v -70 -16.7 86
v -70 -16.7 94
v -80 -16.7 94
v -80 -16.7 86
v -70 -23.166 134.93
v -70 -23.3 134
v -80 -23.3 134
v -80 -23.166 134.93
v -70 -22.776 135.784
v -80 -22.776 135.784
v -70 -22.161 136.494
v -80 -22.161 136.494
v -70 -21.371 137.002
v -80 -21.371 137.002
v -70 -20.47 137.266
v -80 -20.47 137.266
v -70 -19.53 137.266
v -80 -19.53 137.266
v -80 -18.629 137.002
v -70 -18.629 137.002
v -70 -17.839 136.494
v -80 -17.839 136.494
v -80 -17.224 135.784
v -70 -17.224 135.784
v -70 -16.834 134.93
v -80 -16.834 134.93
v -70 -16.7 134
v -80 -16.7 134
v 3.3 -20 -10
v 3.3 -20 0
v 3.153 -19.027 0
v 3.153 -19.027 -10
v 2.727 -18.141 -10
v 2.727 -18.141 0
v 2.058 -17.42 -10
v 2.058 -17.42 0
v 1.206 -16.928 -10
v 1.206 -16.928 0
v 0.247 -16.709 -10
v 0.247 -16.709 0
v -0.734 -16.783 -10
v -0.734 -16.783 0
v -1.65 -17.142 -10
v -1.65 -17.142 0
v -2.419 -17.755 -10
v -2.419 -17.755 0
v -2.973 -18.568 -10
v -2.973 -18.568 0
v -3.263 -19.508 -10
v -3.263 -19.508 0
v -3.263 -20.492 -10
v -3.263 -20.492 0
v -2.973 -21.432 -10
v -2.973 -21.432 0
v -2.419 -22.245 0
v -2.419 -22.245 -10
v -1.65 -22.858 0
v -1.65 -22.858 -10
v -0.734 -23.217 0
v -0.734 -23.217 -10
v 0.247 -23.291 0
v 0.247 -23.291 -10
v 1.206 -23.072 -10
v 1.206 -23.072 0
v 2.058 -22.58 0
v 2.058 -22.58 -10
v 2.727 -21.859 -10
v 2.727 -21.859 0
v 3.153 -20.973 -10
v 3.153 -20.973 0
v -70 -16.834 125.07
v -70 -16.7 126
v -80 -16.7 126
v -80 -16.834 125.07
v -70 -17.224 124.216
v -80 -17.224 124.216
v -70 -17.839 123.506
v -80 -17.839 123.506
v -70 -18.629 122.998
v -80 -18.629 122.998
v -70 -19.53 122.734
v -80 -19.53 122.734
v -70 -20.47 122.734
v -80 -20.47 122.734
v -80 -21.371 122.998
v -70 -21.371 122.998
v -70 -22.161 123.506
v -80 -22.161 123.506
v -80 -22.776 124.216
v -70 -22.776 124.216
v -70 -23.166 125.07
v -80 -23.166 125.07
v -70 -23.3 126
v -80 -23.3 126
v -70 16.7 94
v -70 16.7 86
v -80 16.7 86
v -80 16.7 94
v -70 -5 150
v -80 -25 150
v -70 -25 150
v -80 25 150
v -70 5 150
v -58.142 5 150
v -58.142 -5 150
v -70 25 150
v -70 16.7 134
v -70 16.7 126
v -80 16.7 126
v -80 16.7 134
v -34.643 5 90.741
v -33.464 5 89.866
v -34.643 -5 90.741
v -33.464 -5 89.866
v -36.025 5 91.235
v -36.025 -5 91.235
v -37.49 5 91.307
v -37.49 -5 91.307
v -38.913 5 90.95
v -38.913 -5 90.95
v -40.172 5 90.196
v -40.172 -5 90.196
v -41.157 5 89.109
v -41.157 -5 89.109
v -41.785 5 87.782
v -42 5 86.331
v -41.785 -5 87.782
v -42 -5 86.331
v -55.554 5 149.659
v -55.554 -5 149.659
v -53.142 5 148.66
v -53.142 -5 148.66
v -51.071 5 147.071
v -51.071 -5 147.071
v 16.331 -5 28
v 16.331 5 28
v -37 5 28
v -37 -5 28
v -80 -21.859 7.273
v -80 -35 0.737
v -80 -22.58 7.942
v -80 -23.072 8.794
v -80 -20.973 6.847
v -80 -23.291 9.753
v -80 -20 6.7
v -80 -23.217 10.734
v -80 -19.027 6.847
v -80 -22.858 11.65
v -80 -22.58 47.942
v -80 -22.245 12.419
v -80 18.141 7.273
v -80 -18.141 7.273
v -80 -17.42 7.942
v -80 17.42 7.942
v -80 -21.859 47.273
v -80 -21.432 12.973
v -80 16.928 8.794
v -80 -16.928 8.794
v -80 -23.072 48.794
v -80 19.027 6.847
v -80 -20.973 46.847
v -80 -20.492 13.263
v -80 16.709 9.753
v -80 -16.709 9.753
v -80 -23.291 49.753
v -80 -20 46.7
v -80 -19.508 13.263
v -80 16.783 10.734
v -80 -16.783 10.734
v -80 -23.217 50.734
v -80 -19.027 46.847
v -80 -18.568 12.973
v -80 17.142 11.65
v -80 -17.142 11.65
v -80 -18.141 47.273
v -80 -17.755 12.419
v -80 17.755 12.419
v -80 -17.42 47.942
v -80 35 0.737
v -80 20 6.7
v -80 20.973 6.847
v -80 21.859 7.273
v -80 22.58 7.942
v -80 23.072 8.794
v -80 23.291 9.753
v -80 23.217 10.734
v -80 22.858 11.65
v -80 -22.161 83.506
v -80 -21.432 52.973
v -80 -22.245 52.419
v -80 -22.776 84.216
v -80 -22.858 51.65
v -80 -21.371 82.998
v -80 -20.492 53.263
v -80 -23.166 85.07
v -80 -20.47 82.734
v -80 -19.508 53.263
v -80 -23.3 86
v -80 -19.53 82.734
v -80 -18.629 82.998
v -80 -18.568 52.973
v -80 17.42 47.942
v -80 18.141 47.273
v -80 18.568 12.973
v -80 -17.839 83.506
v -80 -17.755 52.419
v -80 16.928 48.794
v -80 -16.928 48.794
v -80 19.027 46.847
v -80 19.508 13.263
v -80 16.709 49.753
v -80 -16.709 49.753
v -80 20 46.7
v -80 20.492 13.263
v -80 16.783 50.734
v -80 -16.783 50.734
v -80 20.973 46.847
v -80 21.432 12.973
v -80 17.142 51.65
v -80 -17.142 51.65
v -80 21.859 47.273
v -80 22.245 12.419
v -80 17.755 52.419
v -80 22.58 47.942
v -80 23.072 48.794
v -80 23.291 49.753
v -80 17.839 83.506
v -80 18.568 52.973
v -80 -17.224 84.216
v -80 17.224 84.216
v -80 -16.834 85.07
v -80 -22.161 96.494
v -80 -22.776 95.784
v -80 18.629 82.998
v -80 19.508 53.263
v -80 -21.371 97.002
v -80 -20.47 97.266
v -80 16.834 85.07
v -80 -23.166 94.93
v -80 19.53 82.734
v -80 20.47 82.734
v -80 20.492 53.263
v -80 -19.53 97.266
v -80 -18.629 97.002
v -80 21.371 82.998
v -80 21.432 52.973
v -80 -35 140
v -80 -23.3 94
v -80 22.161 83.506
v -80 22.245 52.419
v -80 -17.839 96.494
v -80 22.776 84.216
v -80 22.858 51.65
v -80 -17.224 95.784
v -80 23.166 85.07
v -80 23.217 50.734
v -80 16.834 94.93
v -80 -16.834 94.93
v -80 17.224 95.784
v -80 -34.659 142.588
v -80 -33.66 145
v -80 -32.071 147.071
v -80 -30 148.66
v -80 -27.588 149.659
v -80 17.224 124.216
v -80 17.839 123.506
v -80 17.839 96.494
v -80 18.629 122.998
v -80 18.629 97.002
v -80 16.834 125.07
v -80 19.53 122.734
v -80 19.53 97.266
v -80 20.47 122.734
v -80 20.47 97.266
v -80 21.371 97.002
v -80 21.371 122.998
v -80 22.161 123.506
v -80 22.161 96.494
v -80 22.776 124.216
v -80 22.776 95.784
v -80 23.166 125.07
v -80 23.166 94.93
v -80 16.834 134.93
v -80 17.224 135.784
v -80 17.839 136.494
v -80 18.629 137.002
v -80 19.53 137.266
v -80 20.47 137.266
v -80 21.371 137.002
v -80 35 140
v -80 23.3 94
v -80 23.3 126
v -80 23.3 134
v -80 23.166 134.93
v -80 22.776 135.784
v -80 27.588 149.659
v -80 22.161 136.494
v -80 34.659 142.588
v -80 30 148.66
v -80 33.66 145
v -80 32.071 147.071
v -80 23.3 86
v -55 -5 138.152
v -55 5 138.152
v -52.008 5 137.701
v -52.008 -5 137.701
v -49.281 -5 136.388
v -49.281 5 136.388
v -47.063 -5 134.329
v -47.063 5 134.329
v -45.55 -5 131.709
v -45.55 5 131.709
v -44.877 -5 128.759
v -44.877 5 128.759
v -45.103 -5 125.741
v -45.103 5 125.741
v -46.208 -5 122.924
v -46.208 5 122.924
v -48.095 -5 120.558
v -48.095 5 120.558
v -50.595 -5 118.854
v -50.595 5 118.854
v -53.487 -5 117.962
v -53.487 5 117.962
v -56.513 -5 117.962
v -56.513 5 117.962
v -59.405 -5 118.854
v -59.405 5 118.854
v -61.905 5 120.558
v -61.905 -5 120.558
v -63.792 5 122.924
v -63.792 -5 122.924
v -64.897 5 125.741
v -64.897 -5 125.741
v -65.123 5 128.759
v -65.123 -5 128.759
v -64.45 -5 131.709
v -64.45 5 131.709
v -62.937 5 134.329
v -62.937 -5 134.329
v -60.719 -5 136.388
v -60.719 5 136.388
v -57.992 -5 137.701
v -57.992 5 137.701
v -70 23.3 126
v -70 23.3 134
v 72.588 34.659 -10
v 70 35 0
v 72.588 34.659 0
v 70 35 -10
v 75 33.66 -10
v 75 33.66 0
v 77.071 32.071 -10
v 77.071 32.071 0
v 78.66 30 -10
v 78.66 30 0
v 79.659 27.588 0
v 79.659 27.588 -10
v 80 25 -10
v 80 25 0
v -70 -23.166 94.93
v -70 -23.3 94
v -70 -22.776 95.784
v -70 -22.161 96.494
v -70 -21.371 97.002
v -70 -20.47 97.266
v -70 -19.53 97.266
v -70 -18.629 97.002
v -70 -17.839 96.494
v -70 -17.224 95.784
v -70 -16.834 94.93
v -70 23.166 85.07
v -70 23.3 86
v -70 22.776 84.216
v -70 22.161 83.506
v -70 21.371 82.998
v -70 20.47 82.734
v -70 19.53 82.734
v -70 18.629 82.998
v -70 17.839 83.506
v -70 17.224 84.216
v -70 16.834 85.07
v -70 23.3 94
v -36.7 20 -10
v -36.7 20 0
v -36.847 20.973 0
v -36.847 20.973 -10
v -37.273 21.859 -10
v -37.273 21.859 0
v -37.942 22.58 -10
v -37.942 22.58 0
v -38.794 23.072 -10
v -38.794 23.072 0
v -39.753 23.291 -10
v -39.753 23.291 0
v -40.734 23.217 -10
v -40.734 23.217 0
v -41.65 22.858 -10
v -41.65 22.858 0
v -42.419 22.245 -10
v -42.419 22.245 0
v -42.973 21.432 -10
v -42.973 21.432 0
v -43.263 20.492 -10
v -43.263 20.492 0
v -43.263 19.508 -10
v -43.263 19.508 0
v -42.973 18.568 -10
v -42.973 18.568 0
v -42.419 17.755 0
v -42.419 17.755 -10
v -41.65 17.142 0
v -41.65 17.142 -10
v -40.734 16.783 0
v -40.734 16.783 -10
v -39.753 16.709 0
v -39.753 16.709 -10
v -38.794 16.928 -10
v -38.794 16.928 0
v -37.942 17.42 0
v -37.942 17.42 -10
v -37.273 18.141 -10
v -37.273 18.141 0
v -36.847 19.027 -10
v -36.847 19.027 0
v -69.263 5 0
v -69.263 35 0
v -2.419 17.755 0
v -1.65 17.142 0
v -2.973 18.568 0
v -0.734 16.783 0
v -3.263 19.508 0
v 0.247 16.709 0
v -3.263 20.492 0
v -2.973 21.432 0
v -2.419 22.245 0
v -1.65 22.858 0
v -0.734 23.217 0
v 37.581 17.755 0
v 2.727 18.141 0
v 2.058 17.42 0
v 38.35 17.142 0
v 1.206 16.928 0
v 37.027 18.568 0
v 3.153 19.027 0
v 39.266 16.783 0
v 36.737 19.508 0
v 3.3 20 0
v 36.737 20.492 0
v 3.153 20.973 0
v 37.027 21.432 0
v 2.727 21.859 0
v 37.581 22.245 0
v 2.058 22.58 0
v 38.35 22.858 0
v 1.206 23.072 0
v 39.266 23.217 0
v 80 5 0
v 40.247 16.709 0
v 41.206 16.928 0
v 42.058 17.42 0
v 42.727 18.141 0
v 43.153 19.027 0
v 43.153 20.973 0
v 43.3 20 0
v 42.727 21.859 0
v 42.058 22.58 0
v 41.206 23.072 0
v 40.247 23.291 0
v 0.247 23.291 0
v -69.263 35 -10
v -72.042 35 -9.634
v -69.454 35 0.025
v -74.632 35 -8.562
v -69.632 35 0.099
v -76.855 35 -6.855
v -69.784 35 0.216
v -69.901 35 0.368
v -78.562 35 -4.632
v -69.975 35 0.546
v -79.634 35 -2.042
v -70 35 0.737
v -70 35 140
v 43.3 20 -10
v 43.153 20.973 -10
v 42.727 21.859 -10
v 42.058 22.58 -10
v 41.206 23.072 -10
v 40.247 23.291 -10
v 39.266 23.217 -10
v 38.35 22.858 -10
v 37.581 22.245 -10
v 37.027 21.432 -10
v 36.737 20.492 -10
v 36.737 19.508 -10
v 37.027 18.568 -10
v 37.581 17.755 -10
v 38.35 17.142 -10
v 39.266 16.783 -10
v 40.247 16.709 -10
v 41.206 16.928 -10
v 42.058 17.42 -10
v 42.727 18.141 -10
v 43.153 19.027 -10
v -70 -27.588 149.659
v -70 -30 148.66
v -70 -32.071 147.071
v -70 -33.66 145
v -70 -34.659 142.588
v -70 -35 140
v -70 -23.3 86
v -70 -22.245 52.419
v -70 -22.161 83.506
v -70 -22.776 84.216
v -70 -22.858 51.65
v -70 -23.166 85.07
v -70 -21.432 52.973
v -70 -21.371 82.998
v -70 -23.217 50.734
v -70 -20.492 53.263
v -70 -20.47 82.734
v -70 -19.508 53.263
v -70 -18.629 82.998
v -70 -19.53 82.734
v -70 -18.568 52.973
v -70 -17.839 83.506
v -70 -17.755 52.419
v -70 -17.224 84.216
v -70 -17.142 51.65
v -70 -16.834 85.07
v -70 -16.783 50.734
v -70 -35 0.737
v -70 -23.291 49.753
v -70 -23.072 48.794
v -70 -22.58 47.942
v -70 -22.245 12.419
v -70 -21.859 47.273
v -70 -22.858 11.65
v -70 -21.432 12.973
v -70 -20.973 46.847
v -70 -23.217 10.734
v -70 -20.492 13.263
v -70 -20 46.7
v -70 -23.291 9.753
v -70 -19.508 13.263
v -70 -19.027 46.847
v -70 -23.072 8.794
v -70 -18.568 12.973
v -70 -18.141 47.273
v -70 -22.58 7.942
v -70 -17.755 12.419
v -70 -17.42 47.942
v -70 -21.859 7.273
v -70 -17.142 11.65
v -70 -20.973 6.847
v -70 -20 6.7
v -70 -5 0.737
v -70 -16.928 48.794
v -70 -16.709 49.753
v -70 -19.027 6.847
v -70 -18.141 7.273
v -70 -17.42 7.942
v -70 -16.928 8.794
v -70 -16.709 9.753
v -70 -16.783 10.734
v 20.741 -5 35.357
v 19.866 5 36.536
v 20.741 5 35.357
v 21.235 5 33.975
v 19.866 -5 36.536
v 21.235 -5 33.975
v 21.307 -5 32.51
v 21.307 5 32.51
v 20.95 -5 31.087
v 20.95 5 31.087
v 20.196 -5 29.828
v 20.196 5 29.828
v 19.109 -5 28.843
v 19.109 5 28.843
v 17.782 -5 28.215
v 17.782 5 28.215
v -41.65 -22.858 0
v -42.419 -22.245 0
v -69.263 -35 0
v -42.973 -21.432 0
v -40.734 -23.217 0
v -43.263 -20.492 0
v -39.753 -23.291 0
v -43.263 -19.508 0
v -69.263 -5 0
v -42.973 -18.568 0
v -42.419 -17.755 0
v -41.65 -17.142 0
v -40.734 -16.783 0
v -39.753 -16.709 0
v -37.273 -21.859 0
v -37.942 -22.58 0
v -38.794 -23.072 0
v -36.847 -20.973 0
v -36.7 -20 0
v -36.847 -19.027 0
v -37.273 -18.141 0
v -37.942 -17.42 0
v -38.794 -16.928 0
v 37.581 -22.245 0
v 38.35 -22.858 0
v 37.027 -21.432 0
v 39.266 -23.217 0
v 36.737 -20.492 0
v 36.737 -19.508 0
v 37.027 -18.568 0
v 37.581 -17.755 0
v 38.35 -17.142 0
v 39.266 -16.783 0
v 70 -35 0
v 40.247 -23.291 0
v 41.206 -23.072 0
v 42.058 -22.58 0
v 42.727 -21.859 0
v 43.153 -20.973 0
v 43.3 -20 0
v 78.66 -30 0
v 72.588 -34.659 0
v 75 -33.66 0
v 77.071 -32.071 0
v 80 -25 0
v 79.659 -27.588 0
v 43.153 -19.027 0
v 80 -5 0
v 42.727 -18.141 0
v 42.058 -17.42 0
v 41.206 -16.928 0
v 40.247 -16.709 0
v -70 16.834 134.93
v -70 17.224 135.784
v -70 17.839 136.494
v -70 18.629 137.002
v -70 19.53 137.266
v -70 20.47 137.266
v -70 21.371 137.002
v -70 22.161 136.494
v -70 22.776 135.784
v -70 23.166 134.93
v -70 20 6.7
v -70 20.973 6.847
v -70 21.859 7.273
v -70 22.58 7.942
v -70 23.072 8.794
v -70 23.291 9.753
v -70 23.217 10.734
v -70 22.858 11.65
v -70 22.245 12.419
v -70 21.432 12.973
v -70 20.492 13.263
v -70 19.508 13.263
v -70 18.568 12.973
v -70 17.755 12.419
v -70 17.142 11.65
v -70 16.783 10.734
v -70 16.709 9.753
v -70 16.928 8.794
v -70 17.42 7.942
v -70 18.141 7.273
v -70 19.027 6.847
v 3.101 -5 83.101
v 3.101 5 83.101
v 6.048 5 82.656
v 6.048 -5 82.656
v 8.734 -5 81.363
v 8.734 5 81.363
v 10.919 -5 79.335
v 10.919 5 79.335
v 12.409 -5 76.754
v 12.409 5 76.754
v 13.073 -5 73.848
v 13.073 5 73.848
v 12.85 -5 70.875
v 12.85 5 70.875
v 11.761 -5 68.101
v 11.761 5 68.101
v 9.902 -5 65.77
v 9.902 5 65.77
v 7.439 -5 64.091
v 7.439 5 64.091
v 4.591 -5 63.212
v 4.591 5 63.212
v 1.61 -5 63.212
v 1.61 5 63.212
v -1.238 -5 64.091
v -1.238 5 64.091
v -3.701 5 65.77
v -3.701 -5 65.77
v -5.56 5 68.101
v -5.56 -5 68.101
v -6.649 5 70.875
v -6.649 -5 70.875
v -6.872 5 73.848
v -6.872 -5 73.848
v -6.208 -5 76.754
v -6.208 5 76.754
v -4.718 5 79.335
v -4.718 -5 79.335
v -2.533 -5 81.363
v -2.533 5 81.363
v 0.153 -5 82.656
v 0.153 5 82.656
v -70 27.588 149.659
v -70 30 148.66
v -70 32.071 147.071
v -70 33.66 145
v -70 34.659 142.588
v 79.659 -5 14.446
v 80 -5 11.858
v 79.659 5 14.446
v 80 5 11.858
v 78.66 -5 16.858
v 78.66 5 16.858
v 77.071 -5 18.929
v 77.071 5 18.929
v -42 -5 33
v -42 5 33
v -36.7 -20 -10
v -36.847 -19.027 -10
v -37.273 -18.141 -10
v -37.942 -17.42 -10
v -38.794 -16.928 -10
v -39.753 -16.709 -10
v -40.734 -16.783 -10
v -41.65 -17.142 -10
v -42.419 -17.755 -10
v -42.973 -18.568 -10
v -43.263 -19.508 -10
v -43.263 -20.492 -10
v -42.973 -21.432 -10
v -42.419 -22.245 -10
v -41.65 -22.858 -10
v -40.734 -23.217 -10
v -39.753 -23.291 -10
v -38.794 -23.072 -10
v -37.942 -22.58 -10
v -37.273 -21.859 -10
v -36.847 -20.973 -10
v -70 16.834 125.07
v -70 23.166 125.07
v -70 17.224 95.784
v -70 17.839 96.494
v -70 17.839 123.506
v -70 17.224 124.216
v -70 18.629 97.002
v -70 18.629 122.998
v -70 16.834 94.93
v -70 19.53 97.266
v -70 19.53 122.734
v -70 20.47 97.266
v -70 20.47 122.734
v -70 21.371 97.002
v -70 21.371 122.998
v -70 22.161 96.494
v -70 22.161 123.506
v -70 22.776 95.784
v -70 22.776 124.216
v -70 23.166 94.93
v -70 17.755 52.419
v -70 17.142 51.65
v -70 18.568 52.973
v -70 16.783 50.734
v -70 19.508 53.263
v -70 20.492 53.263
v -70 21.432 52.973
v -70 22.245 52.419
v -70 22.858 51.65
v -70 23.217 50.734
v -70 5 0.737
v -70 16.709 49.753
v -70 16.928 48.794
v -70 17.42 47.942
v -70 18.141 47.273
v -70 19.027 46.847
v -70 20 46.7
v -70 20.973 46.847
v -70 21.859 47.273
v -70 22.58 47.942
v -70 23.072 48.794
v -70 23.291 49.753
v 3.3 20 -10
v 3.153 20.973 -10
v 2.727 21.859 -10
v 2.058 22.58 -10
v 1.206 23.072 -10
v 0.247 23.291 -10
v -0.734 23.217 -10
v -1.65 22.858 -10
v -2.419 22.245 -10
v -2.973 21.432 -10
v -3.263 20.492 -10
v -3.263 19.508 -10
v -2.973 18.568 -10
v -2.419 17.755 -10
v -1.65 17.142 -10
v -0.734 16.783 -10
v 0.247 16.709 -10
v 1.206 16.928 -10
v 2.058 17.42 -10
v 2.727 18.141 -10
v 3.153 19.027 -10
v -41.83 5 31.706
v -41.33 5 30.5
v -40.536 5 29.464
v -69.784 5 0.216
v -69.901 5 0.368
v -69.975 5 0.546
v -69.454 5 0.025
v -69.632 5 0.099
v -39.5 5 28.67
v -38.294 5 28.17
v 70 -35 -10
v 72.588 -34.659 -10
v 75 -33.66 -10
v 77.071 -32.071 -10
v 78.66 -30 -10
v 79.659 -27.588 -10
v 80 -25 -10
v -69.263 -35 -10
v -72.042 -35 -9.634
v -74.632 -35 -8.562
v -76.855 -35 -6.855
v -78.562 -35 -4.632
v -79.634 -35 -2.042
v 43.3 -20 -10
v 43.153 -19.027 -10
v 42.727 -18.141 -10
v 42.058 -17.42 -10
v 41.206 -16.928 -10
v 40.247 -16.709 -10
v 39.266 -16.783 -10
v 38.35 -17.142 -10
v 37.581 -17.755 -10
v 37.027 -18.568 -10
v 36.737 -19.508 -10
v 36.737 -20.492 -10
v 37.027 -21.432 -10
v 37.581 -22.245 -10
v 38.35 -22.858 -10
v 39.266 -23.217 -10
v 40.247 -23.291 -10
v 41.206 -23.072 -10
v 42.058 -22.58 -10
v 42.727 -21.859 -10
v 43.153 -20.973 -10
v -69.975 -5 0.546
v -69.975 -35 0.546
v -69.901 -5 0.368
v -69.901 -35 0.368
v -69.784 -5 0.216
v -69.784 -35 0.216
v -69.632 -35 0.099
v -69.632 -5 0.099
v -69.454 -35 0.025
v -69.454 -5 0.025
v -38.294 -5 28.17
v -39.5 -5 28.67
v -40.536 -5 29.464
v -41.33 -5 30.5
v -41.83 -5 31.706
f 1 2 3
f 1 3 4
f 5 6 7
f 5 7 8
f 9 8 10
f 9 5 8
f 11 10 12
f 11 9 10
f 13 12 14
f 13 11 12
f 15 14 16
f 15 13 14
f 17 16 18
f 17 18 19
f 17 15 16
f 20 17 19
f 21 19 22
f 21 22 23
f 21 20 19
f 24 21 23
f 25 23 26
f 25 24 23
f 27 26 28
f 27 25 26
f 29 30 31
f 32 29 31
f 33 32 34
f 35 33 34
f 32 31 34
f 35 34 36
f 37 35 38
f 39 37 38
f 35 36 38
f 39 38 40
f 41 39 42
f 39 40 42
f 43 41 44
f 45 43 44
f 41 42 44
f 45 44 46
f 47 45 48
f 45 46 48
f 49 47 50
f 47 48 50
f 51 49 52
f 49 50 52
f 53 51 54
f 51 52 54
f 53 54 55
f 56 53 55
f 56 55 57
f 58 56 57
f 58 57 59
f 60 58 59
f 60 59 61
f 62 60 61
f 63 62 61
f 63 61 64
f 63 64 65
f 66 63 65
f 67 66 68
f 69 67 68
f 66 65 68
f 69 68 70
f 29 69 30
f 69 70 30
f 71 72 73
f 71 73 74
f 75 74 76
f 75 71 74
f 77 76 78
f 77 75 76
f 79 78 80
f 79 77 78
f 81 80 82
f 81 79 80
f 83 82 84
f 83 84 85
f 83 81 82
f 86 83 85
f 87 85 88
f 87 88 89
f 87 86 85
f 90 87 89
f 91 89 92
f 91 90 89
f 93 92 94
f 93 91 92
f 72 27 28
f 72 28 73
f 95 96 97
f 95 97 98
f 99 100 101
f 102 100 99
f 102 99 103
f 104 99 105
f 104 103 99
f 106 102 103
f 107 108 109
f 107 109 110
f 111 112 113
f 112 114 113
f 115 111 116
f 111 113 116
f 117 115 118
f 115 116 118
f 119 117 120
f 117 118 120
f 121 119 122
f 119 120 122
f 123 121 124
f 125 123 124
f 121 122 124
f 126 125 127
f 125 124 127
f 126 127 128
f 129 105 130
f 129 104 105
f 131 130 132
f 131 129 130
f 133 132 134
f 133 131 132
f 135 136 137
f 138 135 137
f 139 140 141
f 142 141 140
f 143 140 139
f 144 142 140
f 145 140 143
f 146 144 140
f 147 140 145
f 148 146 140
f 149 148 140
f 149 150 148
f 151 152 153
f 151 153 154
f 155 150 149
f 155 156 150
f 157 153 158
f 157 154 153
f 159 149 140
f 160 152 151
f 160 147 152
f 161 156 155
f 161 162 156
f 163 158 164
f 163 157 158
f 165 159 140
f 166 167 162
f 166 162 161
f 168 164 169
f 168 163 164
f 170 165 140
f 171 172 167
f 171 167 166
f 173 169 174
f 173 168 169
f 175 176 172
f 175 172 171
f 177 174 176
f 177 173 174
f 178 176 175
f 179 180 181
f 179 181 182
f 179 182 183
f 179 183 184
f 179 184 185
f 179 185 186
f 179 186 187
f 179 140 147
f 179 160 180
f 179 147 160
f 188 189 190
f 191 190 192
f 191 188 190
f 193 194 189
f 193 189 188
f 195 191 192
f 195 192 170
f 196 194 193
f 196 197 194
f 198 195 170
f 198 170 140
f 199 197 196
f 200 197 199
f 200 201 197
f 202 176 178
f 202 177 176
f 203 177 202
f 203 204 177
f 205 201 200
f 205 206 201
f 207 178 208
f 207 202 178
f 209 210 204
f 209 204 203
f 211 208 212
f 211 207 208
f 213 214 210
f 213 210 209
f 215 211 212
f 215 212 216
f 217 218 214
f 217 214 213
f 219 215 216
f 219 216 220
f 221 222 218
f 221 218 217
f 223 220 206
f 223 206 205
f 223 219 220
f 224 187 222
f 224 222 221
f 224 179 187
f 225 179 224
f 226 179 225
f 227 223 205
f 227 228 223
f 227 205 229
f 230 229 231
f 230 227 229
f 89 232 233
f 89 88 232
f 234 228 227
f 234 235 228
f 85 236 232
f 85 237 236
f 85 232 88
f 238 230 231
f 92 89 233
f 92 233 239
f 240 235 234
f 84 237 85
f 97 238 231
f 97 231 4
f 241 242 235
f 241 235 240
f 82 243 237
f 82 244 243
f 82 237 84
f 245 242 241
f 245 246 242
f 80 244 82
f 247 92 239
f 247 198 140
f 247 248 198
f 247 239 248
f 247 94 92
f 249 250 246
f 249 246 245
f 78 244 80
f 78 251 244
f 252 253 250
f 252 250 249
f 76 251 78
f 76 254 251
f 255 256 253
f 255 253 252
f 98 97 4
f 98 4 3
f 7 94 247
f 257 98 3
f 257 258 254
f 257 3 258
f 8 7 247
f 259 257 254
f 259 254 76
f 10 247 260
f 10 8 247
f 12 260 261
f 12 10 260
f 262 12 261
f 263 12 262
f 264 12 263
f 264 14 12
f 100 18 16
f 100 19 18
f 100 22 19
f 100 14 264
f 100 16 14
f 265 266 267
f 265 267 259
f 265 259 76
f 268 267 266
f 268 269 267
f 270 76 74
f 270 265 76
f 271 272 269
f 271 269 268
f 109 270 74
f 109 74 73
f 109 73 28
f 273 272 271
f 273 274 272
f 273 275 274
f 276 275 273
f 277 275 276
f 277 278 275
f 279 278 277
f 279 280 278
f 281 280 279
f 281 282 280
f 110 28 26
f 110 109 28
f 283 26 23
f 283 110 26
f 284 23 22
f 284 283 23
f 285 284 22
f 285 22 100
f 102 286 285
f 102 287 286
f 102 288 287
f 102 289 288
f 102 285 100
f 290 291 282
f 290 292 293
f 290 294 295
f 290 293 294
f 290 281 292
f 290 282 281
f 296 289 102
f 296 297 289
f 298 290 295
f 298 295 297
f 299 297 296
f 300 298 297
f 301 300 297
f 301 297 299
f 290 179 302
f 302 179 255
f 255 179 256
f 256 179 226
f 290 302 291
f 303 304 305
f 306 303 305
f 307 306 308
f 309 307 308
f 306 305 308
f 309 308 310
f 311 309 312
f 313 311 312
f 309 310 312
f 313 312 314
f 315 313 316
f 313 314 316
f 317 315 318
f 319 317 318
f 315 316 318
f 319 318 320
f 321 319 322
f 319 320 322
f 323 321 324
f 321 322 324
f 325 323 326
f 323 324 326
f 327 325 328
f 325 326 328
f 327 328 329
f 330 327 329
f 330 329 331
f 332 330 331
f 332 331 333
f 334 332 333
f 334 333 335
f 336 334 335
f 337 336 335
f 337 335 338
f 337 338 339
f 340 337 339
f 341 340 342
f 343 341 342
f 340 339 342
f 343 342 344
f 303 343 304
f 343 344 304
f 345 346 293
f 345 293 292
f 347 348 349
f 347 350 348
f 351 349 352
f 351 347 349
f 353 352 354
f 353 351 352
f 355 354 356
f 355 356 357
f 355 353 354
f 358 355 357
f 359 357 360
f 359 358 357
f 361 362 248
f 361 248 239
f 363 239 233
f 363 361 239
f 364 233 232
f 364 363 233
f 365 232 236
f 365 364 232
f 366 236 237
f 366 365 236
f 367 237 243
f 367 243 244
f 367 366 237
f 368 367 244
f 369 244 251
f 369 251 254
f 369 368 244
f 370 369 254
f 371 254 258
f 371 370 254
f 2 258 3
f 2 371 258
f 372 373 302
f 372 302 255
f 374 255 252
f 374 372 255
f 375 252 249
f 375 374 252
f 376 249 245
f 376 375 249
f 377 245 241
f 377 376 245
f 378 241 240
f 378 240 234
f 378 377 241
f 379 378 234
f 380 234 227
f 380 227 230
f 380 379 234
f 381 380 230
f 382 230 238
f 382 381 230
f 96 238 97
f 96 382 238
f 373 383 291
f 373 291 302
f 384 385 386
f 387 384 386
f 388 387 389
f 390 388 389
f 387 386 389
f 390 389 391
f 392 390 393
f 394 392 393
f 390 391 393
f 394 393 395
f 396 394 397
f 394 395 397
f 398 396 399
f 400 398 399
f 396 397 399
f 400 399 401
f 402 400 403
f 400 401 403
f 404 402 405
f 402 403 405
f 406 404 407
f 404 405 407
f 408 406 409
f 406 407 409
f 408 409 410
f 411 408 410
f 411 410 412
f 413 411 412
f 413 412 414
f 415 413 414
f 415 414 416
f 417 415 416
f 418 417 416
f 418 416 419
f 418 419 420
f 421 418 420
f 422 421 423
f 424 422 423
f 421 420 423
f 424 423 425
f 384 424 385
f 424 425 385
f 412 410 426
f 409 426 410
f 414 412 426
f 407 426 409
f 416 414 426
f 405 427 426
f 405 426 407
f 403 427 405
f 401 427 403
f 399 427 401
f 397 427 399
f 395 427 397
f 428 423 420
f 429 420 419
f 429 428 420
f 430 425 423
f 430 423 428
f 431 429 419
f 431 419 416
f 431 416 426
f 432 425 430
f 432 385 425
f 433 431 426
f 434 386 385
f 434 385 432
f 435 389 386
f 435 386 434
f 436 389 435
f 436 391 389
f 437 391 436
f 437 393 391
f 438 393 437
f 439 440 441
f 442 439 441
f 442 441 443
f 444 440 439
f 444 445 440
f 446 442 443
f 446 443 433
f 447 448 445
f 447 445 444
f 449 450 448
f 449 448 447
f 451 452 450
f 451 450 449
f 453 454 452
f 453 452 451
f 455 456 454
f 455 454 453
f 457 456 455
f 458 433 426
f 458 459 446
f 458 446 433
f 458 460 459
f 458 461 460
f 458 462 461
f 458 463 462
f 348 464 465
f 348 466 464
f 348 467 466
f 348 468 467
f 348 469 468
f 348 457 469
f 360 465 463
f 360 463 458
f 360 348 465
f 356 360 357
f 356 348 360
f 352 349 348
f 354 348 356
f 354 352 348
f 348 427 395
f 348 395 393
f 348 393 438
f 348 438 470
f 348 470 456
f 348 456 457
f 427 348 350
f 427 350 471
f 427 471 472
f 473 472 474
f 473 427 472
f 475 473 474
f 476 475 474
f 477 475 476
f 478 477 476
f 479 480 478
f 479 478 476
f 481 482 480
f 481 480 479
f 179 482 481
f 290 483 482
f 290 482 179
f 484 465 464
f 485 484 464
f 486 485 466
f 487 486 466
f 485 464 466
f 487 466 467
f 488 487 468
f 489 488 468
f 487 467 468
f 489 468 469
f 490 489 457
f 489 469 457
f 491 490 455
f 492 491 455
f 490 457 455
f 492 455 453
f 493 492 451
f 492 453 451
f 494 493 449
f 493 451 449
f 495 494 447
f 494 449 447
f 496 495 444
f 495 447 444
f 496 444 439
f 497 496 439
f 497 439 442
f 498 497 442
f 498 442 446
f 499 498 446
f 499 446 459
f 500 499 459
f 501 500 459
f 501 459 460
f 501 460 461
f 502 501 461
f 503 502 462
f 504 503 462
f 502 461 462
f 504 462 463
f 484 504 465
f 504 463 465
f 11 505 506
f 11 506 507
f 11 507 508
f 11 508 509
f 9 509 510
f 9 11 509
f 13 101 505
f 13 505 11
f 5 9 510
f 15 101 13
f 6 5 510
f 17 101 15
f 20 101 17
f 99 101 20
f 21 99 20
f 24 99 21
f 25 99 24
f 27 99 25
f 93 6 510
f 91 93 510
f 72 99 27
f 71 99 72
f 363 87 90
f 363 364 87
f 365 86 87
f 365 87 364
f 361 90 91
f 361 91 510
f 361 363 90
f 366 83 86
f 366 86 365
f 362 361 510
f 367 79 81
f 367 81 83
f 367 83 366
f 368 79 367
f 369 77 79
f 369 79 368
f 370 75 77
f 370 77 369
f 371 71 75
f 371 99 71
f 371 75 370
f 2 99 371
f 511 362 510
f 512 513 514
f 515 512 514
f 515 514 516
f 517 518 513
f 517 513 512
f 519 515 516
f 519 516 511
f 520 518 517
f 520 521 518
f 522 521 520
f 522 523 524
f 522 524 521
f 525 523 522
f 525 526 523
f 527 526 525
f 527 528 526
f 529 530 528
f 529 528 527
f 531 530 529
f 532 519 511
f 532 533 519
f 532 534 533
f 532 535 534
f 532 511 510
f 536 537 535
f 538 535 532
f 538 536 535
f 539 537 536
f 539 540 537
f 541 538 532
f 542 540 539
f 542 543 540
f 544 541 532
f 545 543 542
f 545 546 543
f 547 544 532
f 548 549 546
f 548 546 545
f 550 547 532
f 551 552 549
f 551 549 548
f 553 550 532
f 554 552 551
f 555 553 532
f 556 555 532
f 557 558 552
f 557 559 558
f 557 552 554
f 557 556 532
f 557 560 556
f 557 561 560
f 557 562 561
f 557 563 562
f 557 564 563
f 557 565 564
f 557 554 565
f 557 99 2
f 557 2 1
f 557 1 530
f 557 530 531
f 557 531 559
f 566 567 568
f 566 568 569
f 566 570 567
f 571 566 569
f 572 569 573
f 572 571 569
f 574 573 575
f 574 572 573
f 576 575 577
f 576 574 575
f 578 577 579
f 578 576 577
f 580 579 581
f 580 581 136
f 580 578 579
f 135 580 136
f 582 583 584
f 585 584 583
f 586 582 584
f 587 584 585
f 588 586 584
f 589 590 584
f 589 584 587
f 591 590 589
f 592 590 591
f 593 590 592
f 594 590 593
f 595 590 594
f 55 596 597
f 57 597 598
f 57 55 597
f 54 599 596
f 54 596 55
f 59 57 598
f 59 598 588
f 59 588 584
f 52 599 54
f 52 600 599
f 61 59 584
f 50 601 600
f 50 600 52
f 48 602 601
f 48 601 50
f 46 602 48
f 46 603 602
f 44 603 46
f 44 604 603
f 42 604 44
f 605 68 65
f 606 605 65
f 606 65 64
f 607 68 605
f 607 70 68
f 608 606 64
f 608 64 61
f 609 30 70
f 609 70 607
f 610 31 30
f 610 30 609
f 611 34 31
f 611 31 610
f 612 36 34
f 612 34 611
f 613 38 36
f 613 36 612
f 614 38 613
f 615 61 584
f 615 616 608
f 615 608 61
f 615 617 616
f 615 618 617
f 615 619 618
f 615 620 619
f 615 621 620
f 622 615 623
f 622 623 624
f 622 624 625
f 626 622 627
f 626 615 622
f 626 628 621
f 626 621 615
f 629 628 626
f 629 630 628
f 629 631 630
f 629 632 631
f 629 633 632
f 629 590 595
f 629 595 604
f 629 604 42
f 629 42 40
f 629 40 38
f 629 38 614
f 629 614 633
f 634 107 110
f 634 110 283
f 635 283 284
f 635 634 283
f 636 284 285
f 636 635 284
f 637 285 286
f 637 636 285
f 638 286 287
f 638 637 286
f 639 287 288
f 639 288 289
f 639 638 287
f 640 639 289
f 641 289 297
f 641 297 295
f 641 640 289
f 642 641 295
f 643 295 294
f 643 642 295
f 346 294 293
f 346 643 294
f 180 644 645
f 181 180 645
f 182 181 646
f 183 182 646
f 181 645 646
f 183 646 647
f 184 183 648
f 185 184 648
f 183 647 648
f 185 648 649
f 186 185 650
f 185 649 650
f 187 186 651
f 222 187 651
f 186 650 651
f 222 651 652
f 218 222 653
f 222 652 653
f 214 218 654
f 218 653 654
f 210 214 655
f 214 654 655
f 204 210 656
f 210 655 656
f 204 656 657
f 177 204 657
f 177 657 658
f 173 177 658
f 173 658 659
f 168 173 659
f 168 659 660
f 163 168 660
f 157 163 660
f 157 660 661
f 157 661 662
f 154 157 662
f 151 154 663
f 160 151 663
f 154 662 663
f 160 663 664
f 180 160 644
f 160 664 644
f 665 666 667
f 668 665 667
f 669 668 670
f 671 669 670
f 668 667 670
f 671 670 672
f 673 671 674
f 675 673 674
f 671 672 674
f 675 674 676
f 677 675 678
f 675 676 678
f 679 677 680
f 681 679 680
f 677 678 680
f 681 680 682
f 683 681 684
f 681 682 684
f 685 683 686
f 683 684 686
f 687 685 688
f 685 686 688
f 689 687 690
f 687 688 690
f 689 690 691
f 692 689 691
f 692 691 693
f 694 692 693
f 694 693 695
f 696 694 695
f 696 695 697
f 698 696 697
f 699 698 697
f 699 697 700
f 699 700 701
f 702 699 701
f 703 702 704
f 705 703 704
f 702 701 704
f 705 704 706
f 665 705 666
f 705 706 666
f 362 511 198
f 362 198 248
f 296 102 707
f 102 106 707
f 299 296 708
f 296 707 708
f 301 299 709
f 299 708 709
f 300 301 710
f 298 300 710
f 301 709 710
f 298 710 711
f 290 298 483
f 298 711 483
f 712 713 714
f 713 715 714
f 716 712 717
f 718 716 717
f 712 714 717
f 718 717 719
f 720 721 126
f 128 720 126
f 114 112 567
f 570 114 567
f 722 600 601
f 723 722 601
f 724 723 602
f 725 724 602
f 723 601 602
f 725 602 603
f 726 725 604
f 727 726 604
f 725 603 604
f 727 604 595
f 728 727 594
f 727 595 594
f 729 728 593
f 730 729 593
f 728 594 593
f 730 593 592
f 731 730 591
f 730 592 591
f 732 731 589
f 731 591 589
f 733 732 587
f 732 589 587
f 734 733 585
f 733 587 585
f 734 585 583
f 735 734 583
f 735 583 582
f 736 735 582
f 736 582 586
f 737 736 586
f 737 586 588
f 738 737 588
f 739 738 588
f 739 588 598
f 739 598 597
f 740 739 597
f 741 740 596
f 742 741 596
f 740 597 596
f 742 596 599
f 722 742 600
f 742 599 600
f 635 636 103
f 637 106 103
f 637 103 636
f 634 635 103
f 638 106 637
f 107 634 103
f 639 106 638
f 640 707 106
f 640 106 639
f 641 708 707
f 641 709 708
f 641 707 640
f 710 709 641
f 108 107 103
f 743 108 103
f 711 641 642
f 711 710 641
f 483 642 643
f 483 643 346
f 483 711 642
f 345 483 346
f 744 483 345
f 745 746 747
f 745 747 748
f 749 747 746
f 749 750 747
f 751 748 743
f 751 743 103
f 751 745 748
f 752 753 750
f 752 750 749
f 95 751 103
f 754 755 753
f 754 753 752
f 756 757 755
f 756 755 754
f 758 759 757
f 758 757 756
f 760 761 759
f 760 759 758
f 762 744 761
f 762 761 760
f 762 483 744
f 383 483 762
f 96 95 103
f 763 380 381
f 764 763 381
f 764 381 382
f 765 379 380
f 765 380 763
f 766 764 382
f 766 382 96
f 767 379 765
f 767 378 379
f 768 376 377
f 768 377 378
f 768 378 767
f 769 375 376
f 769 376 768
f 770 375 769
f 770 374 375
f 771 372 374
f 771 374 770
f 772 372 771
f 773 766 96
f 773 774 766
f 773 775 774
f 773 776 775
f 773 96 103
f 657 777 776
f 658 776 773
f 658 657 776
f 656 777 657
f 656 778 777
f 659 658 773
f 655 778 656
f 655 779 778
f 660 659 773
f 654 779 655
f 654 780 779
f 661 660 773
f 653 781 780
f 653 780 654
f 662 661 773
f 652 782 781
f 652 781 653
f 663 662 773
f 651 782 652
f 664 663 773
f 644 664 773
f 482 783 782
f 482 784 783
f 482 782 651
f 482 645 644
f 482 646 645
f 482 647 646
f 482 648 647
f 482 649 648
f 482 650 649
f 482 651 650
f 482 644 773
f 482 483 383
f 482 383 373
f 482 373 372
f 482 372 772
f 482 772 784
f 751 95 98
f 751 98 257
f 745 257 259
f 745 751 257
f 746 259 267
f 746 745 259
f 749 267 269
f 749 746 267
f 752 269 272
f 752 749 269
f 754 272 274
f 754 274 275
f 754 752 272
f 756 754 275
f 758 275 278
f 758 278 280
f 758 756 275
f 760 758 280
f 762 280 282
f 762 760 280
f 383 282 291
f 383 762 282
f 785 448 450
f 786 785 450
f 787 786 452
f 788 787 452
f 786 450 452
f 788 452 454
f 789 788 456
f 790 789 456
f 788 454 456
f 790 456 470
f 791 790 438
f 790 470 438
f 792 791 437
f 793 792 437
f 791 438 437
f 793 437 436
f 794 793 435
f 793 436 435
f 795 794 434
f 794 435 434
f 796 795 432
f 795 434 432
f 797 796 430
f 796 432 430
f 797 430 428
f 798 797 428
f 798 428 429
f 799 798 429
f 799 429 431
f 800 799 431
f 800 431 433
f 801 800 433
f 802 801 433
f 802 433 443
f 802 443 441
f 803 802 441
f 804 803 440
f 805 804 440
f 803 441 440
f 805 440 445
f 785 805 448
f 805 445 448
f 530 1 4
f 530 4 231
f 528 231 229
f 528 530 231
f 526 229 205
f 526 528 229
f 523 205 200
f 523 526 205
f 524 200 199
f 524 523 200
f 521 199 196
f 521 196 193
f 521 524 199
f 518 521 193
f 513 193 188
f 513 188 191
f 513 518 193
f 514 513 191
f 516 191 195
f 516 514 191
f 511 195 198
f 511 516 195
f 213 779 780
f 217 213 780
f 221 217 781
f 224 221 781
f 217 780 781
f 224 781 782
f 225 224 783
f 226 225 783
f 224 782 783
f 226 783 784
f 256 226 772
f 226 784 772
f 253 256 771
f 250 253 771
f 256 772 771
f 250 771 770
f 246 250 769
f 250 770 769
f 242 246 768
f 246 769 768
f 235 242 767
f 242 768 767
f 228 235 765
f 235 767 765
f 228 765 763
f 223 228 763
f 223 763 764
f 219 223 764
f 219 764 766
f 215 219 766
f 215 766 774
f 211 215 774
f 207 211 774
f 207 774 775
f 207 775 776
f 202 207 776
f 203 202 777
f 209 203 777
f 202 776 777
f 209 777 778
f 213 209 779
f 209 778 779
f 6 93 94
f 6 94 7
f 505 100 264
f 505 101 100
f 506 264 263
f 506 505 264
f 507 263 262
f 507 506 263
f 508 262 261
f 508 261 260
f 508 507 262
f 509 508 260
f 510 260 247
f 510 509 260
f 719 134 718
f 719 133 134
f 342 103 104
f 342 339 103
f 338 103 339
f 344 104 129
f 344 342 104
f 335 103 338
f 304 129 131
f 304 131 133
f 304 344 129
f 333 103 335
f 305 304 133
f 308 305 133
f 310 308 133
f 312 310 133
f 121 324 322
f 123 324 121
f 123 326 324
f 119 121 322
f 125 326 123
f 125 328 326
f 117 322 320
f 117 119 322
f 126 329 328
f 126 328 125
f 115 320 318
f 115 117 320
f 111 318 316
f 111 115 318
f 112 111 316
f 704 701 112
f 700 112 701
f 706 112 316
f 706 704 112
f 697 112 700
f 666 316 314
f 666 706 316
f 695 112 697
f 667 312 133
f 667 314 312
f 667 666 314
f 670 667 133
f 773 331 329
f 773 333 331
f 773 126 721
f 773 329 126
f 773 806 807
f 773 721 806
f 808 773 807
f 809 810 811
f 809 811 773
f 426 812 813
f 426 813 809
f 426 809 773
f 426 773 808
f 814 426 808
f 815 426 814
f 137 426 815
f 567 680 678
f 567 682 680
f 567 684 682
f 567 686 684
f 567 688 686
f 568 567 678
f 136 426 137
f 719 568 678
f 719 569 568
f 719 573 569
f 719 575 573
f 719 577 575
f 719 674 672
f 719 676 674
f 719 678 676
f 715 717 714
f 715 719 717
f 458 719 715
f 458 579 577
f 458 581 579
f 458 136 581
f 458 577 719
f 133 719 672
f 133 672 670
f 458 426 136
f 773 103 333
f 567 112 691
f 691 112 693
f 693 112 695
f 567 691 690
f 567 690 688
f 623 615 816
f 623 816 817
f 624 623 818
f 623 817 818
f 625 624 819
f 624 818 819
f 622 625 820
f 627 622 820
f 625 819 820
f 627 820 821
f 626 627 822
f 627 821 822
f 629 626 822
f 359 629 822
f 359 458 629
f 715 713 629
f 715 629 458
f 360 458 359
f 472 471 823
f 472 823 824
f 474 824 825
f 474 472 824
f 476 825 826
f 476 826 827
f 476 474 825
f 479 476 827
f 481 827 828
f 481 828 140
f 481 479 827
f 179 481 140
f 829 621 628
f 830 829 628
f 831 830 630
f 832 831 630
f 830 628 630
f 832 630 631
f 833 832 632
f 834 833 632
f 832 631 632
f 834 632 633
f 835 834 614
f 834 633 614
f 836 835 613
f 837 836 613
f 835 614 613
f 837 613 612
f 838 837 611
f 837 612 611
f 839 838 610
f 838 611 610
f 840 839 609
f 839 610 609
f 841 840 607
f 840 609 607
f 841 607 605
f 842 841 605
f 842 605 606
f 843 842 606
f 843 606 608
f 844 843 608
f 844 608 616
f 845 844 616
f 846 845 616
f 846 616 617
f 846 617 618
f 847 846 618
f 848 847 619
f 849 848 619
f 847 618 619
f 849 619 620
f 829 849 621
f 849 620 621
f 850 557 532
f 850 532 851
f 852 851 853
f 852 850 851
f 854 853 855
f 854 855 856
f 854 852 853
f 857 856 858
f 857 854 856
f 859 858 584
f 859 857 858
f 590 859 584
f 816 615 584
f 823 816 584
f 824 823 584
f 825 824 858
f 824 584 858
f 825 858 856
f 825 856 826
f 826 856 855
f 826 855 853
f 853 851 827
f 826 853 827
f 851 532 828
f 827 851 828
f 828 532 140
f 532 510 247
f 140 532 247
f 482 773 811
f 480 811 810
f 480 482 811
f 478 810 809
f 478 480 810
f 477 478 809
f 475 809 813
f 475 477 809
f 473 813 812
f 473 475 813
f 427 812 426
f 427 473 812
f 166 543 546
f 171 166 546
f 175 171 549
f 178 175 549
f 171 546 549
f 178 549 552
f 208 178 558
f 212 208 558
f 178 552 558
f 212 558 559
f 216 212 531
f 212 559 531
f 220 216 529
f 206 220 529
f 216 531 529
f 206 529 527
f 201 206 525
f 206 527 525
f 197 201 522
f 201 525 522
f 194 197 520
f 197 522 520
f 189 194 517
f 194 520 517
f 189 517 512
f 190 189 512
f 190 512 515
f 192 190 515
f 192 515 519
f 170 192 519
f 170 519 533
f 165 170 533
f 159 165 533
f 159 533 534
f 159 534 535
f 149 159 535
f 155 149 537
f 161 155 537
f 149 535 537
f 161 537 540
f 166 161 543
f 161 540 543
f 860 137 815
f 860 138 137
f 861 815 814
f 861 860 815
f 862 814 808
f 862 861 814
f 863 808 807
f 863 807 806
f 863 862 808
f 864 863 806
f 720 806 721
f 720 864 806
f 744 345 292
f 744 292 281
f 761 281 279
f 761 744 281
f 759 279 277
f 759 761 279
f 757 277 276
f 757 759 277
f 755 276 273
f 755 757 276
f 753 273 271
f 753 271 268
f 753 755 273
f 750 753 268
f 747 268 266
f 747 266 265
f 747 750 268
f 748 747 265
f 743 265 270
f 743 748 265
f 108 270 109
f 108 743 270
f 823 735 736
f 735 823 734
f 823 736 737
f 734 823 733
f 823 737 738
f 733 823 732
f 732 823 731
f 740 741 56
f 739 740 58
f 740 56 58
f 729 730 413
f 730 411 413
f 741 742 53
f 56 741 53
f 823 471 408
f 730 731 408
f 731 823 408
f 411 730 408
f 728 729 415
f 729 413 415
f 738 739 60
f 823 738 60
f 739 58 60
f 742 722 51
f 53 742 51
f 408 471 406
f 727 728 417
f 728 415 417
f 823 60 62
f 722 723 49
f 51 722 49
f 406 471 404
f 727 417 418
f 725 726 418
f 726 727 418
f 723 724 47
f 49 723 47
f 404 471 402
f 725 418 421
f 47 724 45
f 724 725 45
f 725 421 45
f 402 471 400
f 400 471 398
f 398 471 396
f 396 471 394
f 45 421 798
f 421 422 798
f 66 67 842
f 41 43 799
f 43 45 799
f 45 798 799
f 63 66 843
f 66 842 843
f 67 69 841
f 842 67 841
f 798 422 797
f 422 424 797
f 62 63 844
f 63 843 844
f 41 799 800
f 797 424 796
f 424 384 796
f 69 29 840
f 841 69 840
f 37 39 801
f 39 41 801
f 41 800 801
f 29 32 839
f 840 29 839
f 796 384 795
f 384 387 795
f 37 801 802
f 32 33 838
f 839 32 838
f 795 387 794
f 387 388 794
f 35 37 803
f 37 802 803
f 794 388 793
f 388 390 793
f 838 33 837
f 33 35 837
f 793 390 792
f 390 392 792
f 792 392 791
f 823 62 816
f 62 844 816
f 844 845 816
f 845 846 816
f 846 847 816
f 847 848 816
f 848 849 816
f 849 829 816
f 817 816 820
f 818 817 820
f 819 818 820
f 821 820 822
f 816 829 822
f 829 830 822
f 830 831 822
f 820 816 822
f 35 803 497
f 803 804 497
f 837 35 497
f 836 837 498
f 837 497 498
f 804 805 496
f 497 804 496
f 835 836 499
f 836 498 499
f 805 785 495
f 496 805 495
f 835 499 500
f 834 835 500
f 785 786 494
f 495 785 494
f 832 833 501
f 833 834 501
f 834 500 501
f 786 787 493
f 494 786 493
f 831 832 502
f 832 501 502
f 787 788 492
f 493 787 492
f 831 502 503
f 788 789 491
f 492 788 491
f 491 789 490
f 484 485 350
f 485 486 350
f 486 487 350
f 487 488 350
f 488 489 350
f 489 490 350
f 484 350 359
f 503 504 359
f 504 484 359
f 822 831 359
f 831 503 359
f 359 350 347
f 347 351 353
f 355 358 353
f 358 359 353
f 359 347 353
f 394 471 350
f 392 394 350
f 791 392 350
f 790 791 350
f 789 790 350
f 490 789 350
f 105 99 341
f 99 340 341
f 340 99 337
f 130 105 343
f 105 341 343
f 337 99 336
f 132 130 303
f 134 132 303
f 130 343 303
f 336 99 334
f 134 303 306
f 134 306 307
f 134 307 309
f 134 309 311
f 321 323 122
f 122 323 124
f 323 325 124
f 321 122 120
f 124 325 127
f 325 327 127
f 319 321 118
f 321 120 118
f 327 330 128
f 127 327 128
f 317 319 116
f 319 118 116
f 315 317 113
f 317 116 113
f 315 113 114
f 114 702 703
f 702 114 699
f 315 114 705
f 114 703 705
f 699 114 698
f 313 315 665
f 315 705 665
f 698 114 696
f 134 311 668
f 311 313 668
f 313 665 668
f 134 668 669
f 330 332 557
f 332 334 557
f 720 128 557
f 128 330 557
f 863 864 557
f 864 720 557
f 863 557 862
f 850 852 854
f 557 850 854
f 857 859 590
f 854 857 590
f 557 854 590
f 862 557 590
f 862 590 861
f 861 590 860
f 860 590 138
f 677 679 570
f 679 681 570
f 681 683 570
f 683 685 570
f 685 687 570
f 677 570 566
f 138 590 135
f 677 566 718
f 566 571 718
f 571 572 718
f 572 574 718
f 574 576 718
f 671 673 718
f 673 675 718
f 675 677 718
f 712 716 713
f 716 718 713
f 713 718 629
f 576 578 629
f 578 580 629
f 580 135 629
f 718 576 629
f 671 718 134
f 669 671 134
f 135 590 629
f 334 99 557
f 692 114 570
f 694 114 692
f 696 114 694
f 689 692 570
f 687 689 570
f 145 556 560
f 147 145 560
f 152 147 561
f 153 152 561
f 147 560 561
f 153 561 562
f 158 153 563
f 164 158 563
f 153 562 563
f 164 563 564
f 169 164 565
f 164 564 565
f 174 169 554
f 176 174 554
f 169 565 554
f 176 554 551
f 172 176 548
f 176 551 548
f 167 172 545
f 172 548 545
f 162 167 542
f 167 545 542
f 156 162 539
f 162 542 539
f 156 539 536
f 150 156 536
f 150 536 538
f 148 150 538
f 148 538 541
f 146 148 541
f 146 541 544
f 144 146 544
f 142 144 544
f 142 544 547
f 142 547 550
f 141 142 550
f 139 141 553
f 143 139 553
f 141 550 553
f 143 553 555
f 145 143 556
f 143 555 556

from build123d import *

# Parameters (mm, degrees)
SKETCH_1_W                       = 160
SKETCH_1_H                       = 70
SM_BASE_FLANGE_1_DEPTH           = 10
SM_EDGE_FLANGE_1_STRIP_W         = 41.4732
SM_EDGE_FLANGE_1_STRIP_H         = 10
SM_EDGE_FLANGE_1_STRIP_CUT_DEPTH = 70
SM_EDGE_FLANGE_1_DEPTH           = 70
EXTRUDE_1_DEPTH                  = 5
FILLET_1_R                       = 10
CUT_EXTRUDE_1_DEPTH              = 10
FILLET_2_R                       = 5
SKETCH_11_R                      = 3.3
CUT_EXTRUDE_2_DEPTH              = 10
SKETCH_12_R                      = 3.3
CUT_EXTRUDE_3_DEPTH              = 10
SKETCH_13_R                      = 10
SKETCH_13_R_2                    = 10.151646836
CUT_EXTRUDE_4_DEPTH              = 10


# Sheet-metal steps are written as plain solids
with BuildPart() as part:
    # Sketch 1 → 基体-法兰1 (new body)
    with BuildSketch(Plane.XY):
        Rectangle(SKETCH_1_W, SKETCH_1_H)
    extrude(amount=-SM_BASE_FLANGE_1_DEPTH)

    # 边线-法兰1 strip (across the edge) → 边线-法兰1 strip cut (cut)
    with BuildSketch(Plane(origin=(-80, 35, 0), x_dir=(1, 0, 0), z_dir=(0, -1, 0))):
        with Locations((-10, -5)):
            Rectangle(SM_EDGE_FLANGE_1_STRIP_W, SM_EDGE_FLANGE_1_STRIP_H)
    extrude(amount=SM_EDGE_FLANGE_1_STRIP_CUT_DEPTH, mode=Mode.SUBTRACT)

    # 边线-法兰1 section (across the edge) → 边线-法兰1 (add)
    with BuildSketch(Plane(origin=(-80, 35, 0), x_dir=(1, 0, 0), z_dir=(0, -1, 0))):
        with BuildLine():
            Line((0, 0.7366), (0, 150))
            Line((0, 150), (10, 150))
            Line((10, 150), (10, 0.7366))
            ThreePointArc((10, 0.7366), (10.215745145, 0.215745145), (10.7366, 0))
            Line((10.7366, 0), (10.7366, -10))
            ThreePointArc((10.7366, -10), (3.144677333, -6.855322667), (0, 0.7366))
        make_face()
    extrude(amount=SM_EDGE_FLANGE_1_DEPTH)

    # 草图9 → 凸台-拉伸1 (add, symmetric)
    with BuildSketch(Plane(origin=(0, 0, 0), x_dir=(1, 0, 0), z_dir=(0, 1, 0))):
        with BuildLine():
            Line((-70, -150), (-54, -150))
            Line((-54, -150), (80, -16))
            Line((80, -16), (80, 0))
            Line((80, 0), (-69.2634, 0))
            ThreePointArc((-69.2634, 0), (-69.784254855, -0.215745145), (-70, -0.7366))
            Line((-70, -0.7366), (-70, -150))
        make_face()
    extrude(amount=EXTRUDE_1_DEPTH, both=True)

    # 圆角1
    fillet_1_edges = [part.edges().sort_by_distance(p)[0] for p in [
        (-75, 35, 150),
        (-75, -35, 150),
        (-54, 0, 150),
        (80, 0, 16),
        (80, -35, -5),
        (80, 35, -5),
    ]]
    fillet(fillet_1_edges, radius=FILLET_1_R)

    # 草图10 → 切除-拉伸1 (cut)
    with BuildSketch(Plane(origin=(0, 5, 0), x_dir=(1, 0, 0), z_dir=(0, 1, 0))):
        Polygon((-42, -98.402020254), (28.402020254, -28), (-42, -28), align=None)
    extrude(amount=-CUT_EXTRUDE_1_DEPTH, mode=Mode.SUBTRACT)

    # 圆角2
    fillet_2_edges = [part.edges().sort_by_distance(p)[0] for p in [
        (-42, 0, 98.402020254),
        (-42, 0, 28),
        (28.402020254, 0, 28),
    ]]
    fillet(fillet_2_edges, radius=FILLET_2_R)

    # 草图11 → 切除-拉伸2 (cut)
    with BuildSketch(Plane(origin=(-70, 0, 0), x_dir=(0, 0, -1), z_dir=(1, 0, 0))):
        with Locations((-50, 20)):
            Circle(SKETCH_11_R)
        with Locations((-10, 20)):
            Circle(SKETCH_11_R)
        with Locations((-10, -20)):
            Circle(SKETCH_11_R)
        with Locations((-50, -20)):
            Circle(SKETCH_11_R)
        with BuildLine():
            Line((-134, 23.3), (-126, 23.3))
            ThreePointArc((-126, 23.3), (-122.7, 20), (-126, 16.7))
            Line((-126, 16.7), (-134, 16.7))
            ThreePointArc((-134, 16.7), (-137.3, 20), (-134, 23.3))
        make_face()
        with BuildLine():
            Line((-86, 16.7), (-94, 16.7))
            ThreePointArc((-94, 16.7), (-97.3, 20), (-94, 23.3))
            Line((-94, 23.3), (-86, 23.3))
            ThreePointArc((-86, 23.3), (-82.7, 20), (-86, 16.7))
        make_face()
        with BuildLine():
            Line((-86, -23.3), (-94, -23.3))
            ThreePointArc((-94, -23.3), (-97.3, -20), (-94, -16.7))
            Line((-94, -16.7), (-86, -16.7))
            ThreePointArc((-86, -16.7), (-82.7, -20), (-86, -23.3))
        make_face()
        with BuildLine():
            Line((-126, -23.3), (-134, -23.3))
            ThreePointArc((-134, -23.3), (-137.3, -20), (-134, -16.7))
            Line((-134, -16.7), (-126, -16.7))
            ThreePointArc((-126, -16.7), (-122.7, -20), (-126, -23.3))
        make_face()
    extrude(amount=-CUT_EXTRUDE_2_DEPTH, mode=Mode.SUBTRACT)

    # 草图12 → 切除-拉伸3 (cut)
    with BuildSketch(Plane.XY):
        with Locations((-40, -20)):
            Circle(SKETCH_12_R)
        with Locations((-40, 20)):
            Circle(SKETCH_12_R)
        with Locations((40, 20)):
            Circle(SKETCH_12_R)
        with Locations((40, -20)):
            Circle(SKETCH_12_R)
        with Locations((0, -20)):
            Circle(SKETCH_12_R)
        with Locations((0, 20)):
            Circle(SKETCH_12_R)
    extrude(amount=-CUT_EXTRUDE_3_DEPTH, mode=Mode.SUBTRACT)

    # 草图13 → 切除-拉伸4 (cut)
    with BuildSketch(Plane(origin=(0, 5, 0), x_dir=(1, 0, 0), z_dir=(0, 1, 0))):
        with Locations(Location((3.100505063, -73.100505063, 0), (0, 0, 270))):
            Circle(SKETCH_13_R)
        with Locations(Location((-55, -128, 0), (0, 0, 270))):
            Circle(SKETCH_13_R_2)
    extrude(amount=-CUT_EXTRUDE_4_DEPTH, mode=Mode.SUBTRACT)


solid = part.part
